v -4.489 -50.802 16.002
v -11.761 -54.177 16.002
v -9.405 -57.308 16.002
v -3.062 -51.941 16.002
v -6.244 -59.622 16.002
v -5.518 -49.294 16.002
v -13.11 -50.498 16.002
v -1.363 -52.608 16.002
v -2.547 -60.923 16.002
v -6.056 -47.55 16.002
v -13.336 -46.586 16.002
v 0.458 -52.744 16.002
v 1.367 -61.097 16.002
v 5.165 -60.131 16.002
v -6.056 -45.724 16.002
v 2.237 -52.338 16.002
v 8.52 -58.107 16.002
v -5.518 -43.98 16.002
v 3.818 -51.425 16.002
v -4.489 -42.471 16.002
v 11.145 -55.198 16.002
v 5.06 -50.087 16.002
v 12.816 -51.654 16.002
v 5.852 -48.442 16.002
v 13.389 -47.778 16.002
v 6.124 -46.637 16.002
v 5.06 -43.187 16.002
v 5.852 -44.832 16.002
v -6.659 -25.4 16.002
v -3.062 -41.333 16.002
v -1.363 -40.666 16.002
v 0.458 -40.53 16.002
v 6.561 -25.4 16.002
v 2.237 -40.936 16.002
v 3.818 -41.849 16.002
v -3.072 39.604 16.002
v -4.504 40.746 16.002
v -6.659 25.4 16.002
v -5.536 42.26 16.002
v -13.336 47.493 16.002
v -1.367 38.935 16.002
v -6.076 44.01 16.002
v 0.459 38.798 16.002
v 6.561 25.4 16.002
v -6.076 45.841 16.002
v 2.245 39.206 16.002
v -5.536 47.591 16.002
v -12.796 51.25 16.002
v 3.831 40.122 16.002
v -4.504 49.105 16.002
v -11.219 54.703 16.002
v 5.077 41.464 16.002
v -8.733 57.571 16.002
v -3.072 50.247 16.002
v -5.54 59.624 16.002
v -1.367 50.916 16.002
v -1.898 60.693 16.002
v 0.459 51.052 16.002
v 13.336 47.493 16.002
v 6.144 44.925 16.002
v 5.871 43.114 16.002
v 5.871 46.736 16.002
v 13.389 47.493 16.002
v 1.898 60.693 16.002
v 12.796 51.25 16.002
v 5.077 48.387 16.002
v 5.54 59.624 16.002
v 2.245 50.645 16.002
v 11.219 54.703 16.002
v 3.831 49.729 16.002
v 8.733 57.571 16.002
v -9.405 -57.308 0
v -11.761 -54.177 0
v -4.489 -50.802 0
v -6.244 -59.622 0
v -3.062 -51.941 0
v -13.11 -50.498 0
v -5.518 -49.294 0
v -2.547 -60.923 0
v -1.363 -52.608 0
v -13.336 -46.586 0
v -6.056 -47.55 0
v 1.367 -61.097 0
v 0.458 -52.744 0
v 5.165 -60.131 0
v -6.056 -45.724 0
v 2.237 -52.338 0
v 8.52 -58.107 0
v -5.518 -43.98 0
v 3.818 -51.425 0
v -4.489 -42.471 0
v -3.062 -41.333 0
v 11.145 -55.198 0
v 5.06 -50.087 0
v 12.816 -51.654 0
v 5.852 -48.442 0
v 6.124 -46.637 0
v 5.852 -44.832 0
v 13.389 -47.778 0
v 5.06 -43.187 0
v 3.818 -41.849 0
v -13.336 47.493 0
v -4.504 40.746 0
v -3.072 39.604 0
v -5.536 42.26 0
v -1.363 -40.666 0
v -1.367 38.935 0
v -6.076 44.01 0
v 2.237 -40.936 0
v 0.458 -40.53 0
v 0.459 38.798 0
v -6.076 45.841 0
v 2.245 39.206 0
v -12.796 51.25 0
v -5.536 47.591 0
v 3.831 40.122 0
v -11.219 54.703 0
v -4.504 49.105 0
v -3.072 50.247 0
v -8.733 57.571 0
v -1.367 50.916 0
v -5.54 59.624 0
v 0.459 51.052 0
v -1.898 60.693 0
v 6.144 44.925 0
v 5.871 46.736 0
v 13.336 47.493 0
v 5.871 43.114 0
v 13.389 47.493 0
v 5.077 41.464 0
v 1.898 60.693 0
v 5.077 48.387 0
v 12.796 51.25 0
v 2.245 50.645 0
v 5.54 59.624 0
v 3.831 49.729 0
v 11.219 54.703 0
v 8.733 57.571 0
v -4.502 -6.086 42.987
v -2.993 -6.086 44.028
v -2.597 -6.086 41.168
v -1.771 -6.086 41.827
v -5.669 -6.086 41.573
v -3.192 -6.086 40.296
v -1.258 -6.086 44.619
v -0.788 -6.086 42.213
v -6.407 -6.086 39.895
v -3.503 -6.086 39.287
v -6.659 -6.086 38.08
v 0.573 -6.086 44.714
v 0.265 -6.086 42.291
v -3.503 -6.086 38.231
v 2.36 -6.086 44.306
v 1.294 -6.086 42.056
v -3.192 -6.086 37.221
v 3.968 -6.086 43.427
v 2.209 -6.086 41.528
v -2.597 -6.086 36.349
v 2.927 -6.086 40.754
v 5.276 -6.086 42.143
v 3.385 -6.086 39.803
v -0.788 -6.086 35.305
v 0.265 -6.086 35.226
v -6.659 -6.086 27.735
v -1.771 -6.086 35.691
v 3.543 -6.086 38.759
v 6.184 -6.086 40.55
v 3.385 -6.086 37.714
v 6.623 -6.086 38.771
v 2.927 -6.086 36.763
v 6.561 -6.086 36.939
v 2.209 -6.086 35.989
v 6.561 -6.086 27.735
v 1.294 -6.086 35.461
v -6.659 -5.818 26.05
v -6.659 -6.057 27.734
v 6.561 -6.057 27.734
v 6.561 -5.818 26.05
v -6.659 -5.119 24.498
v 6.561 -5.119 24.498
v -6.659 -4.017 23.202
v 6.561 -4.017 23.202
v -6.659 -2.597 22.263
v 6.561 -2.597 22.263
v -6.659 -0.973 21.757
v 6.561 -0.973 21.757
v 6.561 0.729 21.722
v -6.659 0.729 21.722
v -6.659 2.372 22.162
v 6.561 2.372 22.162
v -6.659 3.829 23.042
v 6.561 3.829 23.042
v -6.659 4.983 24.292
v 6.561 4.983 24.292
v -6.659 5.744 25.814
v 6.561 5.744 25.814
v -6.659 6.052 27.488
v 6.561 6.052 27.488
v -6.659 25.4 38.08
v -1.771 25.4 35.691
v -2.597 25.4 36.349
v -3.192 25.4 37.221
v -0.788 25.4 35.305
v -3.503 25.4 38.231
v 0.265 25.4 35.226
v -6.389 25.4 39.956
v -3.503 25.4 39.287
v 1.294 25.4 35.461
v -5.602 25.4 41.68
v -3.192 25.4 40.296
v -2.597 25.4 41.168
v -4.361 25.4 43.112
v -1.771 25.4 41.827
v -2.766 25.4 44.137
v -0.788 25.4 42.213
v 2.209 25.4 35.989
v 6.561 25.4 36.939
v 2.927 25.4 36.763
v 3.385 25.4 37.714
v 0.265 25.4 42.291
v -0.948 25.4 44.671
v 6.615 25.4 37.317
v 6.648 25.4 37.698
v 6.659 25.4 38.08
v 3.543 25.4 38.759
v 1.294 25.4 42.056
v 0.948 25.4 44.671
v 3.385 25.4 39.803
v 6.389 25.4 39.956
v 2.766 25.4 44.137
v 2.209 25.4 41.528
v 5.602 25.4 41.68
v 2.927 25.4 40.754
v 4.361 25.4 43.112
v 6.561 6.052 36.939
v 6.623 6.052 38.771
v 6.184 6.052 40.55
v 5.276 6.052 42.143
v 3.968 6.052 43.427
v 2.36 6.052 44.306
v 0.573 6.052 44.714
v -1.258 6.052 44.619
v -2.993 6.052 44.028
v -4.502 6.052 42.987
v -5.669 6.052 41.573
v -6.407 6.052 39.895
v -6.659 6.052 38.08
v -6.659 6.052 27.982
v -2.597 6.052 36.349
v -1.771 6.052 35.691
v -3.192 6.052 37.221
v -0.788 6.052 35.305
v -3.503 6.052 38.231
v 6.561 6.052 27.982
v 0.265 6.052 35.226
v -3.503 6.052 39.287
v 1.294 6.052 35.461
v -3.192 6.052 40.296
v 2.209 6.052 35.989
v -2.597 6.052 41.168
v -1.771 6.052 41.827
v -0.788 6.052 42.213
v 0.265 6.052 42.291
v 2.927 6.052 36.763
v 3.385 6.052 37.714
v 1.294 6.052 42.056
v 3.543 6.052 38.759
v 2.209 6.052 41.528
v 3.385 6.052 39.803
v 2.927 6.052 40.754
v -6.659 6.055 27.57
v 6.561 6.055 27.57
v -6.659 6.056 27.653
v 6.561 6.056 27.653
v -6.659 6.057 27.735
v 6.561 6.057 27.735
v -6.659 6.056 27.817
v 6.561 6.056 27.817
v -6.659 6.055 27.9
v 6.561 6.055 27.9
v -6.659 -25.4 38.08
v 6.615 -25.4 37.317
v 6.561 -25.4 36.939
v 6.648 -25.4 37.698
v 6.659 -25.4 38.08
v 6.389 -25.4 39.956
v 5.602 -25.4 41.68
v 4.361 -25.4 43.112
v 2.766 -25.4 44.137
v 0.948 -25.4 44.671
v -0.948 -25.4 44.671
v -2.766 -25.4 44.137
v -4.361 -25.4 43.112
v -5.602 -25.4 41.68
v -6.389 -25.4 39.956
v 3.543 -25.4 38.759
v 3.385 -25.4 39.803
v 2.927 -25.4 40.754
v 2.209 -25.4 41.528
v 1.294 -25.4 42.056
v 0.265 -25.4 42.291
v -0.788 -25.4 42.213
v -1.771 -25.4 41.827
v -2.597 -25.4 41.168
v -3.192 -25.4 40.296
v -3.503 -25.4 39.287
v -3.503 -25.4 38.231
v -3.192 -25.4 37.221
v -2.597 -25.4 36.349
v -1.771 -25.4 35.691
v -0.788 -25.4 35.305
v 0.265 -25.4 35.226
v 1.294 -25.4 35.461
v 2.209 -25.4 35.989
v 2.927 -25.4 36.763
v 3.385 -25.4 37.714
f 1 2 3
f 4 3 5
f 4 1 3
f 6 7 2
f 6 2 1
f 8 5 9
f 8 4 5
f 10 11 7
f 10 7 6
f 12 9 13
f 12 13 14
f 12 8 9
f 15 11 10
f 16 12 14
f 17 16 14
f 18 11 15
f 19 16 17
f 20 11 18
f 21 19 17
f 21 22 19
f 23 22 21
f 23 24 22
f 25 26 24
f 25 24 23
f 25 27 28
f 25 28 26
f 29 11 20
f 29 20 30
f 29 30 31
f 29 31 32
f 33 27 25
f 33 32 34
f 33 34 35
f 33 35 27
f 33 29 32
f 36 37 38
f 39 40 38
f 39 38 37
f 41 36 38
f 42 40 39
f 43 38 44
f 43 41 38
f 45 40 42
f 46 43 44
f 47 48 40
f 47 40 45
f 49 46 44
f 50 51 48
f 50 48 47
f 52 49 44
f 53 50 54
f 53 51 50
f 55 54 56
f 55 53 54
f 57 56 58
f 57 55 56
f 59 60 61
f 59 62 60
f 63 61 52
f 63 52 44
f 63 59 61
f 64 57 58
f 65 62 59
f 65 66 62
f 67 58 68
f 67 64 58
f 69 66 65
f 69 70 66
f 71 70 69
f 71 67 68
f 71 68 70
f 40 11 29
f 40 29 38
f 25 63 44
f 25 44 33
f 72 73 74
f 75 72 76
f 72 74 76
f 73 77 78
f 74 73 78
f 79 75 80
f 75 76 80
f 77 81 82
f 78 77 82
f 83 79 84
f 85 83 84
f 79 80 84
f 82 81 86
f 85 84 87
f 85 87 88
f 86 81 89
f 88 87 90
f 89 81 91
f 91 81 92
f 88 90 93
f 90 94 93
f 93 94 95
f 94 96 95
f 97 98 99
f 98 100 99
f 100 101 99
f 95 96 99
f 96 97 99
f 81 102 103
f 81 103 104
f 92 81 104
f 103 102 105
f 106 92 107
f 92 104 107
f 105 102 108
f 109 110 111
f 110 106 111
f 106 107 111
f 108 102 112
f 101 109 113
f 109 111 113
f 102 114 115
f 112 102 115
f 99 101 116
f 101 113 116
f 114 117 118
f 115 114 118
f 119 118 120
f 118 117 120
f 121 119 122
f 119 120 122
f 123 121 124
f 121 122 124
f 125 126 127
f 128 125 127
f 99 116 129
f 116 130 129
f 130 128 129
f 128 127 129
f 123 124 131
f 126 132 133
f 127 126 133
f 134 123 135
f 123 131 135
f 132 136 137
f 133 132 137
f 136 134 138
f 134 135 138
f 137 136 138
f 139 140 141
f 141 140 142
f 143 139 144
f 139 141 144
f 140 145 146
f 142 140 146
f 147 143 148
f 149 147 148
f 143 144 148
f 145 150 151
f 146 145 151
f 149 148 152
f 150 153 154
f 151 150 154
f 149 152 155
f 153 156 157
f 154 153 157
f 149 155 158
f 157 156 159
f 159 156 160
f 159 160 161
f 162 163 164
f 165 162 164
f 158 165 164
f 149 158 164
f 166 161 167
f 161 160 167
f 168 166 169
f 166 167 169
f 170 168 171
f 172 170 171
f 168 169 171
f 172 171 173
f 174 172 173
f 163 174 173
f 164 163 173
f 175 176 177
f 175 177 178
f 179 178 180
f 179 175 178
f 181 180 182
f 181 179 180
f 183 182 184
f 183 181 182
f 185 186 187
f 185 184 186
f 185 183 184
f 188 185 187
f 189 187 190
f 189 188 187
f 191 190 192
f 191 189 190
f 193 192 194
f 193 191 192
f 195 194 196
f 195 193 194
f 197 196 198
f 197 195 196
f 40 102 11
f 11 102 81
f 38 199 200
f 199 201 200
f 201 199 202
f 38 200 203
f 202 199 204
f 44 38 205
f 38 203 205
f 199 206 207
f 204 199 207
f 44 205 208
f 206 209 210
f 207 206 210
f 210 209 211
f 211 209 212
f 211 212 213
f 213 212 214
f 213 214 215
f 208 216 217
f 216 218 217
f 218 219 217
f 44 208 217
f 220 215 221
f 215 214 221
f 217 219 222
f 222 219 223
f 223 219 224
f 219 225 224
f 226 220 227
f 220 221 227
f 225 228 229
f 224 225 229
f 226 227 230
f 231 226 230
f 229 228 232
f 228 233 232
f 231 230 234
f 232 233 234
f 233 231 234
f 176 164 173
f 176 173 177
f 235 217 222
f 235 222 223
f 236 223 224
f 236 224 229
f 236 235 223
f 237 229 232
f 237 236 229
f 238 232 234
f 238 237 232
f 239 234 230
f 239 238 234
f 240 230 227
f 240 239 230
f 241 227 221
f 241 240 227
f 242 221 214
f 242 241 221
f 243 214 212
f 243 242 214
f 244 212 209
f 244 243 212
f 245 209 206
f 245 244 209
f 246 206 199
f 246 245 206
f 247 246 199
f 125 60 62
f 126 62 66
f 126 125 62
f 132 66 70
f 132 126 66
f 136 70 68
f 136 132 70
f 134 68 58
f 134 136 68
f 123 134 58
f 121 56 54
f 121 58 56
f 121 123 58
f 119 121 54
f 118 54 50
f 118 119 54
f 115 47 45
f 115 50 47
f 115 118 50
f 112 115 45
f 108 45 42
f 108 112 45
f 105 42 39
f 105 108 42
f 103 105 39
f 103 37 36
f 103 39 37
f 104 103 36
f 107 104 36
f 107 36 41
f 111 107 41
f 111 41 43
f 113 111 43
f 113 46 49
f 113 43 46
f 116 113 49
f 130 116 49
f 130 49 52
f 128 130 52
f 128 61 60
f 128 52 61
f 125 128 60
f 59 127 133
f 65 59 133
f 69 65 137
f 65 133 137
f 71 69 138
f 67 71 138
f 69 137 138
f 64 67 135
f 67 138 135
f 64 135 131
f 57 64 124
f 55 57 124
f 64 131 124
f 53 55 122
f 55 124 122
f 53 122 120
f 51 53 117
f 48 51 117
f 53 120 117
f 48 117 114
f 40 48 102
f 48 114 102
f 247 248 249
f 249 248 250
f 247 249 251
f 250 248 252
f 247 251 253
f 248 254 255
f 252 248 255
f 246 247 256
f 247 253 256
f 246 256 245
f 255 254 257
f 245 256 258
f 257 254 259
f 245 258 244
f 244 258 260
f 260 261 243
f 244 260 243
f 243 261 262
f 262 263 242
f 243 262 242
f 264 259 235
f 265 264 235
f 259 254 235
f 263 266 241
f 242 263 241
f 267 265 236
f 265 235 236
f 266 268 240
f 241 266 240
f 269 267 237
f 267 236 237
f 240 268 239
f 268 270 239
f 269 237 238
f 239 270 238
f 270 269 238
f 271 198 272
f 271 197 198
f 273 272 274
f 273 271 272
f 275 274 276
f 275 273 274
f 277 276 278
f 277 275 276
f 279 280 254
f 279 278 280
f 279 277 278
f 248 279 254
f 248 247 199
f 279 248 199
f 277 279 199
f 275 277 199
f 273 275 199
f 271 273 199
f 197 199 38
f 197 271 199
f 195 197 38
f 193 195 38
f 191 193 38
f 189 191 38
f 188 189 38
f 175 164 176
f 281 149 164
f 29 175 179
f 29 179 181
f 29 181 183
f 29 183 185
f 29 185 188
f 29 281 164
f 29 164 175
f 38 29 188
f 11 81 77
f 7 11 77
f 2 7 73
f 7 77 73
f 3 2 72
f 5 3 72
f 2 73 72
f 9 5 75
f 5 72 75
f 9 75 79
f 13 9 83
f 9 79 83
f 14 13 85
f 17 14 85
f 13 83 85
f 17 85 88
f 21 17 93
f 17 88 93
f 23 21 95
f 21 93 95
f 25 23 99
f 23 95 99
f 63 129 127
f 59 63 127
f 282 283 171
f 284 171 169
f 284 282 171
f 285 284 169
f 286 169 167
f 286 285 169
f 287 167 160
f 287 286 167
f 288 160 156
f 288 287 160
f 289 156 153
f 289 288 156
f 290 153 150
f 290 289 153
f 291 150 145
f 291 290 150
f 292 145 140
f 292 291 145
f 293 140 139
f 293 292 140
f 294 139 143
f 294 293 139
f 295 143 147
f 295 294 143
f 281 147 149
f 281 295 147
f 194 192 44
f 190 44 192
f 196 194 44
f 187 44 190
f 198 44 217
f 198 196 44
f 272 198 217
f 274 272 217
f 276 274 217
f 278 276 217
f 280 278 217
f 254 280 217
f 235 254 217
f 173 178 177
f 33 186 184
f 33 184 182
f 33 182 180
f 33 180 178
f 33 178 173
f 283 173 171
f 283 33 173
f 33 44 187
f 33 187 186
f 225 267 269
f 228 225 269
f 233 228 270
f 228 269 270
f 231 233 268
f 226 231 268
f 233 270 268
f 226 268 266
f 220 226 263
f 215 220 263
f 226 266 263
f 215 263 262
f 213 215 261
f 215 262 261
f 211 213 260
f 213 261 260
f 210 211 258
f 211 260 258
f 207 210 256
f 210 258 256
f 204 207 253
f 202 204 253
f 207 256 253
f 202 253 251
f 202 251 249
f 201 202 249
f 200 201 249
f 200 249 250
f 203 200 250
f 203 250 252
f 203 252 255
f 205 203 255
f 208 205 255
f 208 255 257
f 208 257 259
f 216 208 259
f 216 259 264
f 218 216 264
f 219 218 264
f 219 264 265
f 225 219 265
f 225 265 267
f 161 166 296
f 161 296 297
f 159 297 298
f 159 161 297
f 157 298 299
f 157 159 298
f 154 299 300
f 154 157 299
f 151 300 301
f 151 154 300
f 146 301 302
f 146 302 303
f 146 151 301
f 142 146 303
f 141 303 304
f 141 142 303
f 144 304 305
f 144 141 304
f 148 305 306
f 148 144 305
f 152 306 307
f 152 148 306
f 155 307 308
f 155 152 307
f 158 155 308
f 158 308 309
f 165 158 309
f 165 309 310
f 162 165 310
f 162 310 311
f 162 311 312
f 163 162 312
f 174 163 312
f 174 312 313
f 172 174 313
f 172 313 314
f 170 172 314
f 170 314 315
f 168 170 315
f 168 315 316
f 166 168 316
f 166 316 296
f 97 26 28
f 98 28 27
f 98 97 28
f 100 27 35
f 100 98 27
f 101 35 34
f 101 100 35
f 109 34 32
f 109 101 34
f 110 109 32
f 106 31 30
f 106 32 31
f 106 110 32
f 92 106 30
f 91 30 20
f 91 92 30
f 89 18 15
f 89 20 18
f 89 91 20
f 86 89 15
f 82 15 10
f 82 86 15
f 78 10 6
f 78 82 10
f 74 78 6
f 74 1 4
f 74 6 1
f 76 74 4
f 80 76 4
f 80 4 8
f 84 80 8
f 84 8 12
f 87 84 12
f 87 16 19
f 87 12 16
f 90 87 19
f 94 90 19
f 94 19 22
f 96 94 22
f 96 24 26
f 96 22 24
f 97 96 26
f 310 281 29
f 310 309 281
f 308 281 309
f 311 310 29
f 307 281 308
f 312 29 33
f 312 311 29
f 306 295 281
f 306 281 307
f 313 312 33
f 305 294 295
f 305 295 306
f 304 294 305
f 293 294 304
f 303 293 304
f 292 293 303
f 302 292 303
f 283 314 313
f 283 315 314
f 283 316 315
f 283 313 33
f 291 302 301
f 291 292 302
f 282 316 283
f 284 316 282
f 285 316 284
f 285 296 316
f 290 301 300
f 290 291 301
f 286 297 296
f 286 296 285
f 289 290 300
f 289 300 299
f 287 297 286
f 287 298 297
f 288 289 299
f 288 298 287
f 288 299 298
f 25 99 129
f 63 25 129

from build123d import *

# Parameters (mm, degrees)
F1_DEPTH      = 16.002
F2_R          = 6.1442753349
F2_R_2        = 6.1243758279
F3_DEPTH      = 16.003
F5_DEPTH      = 25.4
F5_DEPTH_BACK = 25.4
F7_DEPTH      = 24.13
F7_DEPTH_BACK = 27.178
F8_R          = 3.5427392295
F9_DEPTH      = 25.4
F9_DEPTH_BACK = 25.4


with BuildPart() as f1:
    # F0 (on Top) → F1 (new body)
    with BuildSketch(Plane.XY):
        with BuildLine():
            Line((-13.3363356008, 47.4925674498), (13.3363356008, 47.4925674498))
            ThreePointArc((13.3363356008, 47.4925674498), (0, 60.8289030506), (-13.3363356008, 47.4925674498))
        make_face()
        with BuildLine():
            Line((13.3894772224, 47.4925674498), (13.3363356008, 47.4925674498))
            ThreePointArc((13.3363356008, 47.4925674498), (0, 34.156231849), (-13.3363356008, 47.4925674498))
            Line((-13.3363356008, 47.4925674498), (-13.3363356008, -46.5860655079))
            ThreePointArc((-13.3363356008, -46.5860655079), (0.5964639692, -34.4016239833), (13.3894772224, -47.7778092027))
            Line((13.3894772224, -47.7778092027), (13.3894772224, 47.4925674498))
        make_face()
        with BuildLine():
            ThreePointArc((-13.3363356008, 47.4925674498), (0, 34.156231849), (13.3363356008, 47.4925674498))
            Line((13.3363356008, 47.4925674498), (-13.3363356008, 47.4925674498))
        make_face()
        with BuildLine():
            Line((-13.3363356008, -47.7778092027), (-13.3363356008, -46.5860655079))
            ThreePointArc((-13.3363356008, -46.5860655079), (-0.5964639692, -61.1539944221), (13.3894772224, -47.7778092027))
            Line((13.3894772224, -47.7778092027), (-13.3363356008, -47.7778092027))
        make_face()
        with BuildLine():
            ThreePointArc((13.3894772224, -47.7778092027), (0.5964639692, -34.4016239833), (-13.3363356008, -46.5860655079))
            Line((-13.3363356008, -46.5860655079), (-13.3363356008, -47.7778092027))
            Line((-13.3363356008, -47.7778092027), (13.3894772224, -47.7778092027))
        make_face()
    extrude(amount=F1_DEPTH)

    # F2 (on Top) → F3 (cut, through all)
    with BuildSketch(Plane.XY):
        with Locations((0, 44.9254028499)):
            Circle(F2_R)
        with Locations((0, -46.6368459165)):
            Circle(F2_R_2)
    extrude(amount=F3_DEPTH, mode=Mode.SUBTRACT)

    # F4 (on Front) → F5 (join, two sides)
    with BuildSketch(Plane.XZ) as f5_sk:
        with BuildLine():
            ThreePointArc((6.5605365671, 36.938665784), (6.6343469805, 37.5070254574), (6.6590113547, 38.0796268582))
            ThreePointArc((6.6590113547, 38.0796268582), (0, 44.7386382129), (-6.6590113547, 38.0796268582))
            Line((-6.6590113547, 38.0796268582), (6.5605365671, 38.0796268582))
            Line((6.5605365671, 38.0796268582), (6.5605365671, 36.938665784))
        make_face()
        with BuildLine():
            Line((6.5605365671, 38.0796268582), (-6.6590113547, 38.0796268582))
            ThreePointArc((-6.6590113547, 38.0796268582), (-0.5726014008, 31.4452798778), (6.5605365671, 36.938665784))
            Line((6.5605365671, 36.938665784), (6.5605365671, 38.0796268582))
        make_face()
        with BuildLine():
            ThreePointArc((6.5605365671, 36.938665784), (-0.5726014008, 31.4452798778), (-6.6590113547, 38.0796268582))
            Line((-6.6590113547, 38.0796268582), (-6.6590113547, 2.7097861748))
            Line((-6.6590113547, 2.7097861748), (6.5605365671, 2.7097861748))
            Line((6.5605365671, 2.7097861748), (6.5605365671, 36.938665784))
        make_face()
    extrude(amount=F5_DEPTH)
    extrude(f5_sk.sketch, amount=-F5_DEPTH_BACK)

    # F6 (on Right) → F7 (cut, two sides)
    with BuildSketch(Plane.YZ) as f7_sk:
        with BuildLine():
            Line((6.0519274602, 27.9823391251), (6.0519274602, 27.4877400585))
            ThreePointArc((6.0519274602, 27.4877400585), (6.0557152675, 27.6113640409), (6.0569780455, 27.7350395918))
            ThreePointArc((6.0569780455, 27.7350395918), (6.0557152675, 27.8587151427), (6.0519274602, 27.9823391251))
        make_face()
        with BuildLine():
            Line((-6.0569780165, 27.7344470214), (6.0519274602, 27.4877400585))
            Line((6.0519274602, 27.4877400585), (6.0519274602, 27.9823391251))
            ThreePointArc((6.0519274602, 27.9823391251), (-0.1239717742, 33.7907488023), (-6.0569780165, 27.7344470214))
        make_face()
        with BuildLine():
            ThreePointArc((-6.0569780165, 27.7344470214), (-0.1233793273, 21.6793182817), (6.0519274602, 27.4877400585))
            Line((6.0519274602, 27.4877400585), (-6.0569780165, 27.7344470214))
        make_face()
        with BuildLine():
            Line((-6.08606264, 27.7350395918), (-6.0569780165, 27.7344470214))
            ThreePointArc((-6.0569780165, 27.7344470214), (-0.1239717742, 33.7907488023), (6.0519274602, 27.9823391251))
            Line((6.0519274602, 27.9823391251), (6.0519274602, 48.8666966558))
            Line((6.0519274602, 48.8666966558), (-6.08606264, 48.8666966558))
            Line((-6.08606264, 48.8666966558), (-6.08606264, 27.7350395918))
        make_face()
    extrude(amount=-F7_DEPTH, mode=Mode.SUBTRACT)
    extrude(f7_sk.sketch, amount=F7_DEPTH_BACK, mode=Mode.SUBTRACT)

    # F8 (on Front) → F9 (cut, two sides)
    with BuildSketch(Plane.XZ) as f9_sk:
        with Locations((0, 38.7586243451)):
            Circle(F8_R)
    extrude(amount=-F9_DEPTH, mode=Mode.SUBTRACT)
    extrude(f9_sk.sketch, amount=F9_DEPTH_BACK, mode=Mode.SUBTRACT)


solid = f1.part
